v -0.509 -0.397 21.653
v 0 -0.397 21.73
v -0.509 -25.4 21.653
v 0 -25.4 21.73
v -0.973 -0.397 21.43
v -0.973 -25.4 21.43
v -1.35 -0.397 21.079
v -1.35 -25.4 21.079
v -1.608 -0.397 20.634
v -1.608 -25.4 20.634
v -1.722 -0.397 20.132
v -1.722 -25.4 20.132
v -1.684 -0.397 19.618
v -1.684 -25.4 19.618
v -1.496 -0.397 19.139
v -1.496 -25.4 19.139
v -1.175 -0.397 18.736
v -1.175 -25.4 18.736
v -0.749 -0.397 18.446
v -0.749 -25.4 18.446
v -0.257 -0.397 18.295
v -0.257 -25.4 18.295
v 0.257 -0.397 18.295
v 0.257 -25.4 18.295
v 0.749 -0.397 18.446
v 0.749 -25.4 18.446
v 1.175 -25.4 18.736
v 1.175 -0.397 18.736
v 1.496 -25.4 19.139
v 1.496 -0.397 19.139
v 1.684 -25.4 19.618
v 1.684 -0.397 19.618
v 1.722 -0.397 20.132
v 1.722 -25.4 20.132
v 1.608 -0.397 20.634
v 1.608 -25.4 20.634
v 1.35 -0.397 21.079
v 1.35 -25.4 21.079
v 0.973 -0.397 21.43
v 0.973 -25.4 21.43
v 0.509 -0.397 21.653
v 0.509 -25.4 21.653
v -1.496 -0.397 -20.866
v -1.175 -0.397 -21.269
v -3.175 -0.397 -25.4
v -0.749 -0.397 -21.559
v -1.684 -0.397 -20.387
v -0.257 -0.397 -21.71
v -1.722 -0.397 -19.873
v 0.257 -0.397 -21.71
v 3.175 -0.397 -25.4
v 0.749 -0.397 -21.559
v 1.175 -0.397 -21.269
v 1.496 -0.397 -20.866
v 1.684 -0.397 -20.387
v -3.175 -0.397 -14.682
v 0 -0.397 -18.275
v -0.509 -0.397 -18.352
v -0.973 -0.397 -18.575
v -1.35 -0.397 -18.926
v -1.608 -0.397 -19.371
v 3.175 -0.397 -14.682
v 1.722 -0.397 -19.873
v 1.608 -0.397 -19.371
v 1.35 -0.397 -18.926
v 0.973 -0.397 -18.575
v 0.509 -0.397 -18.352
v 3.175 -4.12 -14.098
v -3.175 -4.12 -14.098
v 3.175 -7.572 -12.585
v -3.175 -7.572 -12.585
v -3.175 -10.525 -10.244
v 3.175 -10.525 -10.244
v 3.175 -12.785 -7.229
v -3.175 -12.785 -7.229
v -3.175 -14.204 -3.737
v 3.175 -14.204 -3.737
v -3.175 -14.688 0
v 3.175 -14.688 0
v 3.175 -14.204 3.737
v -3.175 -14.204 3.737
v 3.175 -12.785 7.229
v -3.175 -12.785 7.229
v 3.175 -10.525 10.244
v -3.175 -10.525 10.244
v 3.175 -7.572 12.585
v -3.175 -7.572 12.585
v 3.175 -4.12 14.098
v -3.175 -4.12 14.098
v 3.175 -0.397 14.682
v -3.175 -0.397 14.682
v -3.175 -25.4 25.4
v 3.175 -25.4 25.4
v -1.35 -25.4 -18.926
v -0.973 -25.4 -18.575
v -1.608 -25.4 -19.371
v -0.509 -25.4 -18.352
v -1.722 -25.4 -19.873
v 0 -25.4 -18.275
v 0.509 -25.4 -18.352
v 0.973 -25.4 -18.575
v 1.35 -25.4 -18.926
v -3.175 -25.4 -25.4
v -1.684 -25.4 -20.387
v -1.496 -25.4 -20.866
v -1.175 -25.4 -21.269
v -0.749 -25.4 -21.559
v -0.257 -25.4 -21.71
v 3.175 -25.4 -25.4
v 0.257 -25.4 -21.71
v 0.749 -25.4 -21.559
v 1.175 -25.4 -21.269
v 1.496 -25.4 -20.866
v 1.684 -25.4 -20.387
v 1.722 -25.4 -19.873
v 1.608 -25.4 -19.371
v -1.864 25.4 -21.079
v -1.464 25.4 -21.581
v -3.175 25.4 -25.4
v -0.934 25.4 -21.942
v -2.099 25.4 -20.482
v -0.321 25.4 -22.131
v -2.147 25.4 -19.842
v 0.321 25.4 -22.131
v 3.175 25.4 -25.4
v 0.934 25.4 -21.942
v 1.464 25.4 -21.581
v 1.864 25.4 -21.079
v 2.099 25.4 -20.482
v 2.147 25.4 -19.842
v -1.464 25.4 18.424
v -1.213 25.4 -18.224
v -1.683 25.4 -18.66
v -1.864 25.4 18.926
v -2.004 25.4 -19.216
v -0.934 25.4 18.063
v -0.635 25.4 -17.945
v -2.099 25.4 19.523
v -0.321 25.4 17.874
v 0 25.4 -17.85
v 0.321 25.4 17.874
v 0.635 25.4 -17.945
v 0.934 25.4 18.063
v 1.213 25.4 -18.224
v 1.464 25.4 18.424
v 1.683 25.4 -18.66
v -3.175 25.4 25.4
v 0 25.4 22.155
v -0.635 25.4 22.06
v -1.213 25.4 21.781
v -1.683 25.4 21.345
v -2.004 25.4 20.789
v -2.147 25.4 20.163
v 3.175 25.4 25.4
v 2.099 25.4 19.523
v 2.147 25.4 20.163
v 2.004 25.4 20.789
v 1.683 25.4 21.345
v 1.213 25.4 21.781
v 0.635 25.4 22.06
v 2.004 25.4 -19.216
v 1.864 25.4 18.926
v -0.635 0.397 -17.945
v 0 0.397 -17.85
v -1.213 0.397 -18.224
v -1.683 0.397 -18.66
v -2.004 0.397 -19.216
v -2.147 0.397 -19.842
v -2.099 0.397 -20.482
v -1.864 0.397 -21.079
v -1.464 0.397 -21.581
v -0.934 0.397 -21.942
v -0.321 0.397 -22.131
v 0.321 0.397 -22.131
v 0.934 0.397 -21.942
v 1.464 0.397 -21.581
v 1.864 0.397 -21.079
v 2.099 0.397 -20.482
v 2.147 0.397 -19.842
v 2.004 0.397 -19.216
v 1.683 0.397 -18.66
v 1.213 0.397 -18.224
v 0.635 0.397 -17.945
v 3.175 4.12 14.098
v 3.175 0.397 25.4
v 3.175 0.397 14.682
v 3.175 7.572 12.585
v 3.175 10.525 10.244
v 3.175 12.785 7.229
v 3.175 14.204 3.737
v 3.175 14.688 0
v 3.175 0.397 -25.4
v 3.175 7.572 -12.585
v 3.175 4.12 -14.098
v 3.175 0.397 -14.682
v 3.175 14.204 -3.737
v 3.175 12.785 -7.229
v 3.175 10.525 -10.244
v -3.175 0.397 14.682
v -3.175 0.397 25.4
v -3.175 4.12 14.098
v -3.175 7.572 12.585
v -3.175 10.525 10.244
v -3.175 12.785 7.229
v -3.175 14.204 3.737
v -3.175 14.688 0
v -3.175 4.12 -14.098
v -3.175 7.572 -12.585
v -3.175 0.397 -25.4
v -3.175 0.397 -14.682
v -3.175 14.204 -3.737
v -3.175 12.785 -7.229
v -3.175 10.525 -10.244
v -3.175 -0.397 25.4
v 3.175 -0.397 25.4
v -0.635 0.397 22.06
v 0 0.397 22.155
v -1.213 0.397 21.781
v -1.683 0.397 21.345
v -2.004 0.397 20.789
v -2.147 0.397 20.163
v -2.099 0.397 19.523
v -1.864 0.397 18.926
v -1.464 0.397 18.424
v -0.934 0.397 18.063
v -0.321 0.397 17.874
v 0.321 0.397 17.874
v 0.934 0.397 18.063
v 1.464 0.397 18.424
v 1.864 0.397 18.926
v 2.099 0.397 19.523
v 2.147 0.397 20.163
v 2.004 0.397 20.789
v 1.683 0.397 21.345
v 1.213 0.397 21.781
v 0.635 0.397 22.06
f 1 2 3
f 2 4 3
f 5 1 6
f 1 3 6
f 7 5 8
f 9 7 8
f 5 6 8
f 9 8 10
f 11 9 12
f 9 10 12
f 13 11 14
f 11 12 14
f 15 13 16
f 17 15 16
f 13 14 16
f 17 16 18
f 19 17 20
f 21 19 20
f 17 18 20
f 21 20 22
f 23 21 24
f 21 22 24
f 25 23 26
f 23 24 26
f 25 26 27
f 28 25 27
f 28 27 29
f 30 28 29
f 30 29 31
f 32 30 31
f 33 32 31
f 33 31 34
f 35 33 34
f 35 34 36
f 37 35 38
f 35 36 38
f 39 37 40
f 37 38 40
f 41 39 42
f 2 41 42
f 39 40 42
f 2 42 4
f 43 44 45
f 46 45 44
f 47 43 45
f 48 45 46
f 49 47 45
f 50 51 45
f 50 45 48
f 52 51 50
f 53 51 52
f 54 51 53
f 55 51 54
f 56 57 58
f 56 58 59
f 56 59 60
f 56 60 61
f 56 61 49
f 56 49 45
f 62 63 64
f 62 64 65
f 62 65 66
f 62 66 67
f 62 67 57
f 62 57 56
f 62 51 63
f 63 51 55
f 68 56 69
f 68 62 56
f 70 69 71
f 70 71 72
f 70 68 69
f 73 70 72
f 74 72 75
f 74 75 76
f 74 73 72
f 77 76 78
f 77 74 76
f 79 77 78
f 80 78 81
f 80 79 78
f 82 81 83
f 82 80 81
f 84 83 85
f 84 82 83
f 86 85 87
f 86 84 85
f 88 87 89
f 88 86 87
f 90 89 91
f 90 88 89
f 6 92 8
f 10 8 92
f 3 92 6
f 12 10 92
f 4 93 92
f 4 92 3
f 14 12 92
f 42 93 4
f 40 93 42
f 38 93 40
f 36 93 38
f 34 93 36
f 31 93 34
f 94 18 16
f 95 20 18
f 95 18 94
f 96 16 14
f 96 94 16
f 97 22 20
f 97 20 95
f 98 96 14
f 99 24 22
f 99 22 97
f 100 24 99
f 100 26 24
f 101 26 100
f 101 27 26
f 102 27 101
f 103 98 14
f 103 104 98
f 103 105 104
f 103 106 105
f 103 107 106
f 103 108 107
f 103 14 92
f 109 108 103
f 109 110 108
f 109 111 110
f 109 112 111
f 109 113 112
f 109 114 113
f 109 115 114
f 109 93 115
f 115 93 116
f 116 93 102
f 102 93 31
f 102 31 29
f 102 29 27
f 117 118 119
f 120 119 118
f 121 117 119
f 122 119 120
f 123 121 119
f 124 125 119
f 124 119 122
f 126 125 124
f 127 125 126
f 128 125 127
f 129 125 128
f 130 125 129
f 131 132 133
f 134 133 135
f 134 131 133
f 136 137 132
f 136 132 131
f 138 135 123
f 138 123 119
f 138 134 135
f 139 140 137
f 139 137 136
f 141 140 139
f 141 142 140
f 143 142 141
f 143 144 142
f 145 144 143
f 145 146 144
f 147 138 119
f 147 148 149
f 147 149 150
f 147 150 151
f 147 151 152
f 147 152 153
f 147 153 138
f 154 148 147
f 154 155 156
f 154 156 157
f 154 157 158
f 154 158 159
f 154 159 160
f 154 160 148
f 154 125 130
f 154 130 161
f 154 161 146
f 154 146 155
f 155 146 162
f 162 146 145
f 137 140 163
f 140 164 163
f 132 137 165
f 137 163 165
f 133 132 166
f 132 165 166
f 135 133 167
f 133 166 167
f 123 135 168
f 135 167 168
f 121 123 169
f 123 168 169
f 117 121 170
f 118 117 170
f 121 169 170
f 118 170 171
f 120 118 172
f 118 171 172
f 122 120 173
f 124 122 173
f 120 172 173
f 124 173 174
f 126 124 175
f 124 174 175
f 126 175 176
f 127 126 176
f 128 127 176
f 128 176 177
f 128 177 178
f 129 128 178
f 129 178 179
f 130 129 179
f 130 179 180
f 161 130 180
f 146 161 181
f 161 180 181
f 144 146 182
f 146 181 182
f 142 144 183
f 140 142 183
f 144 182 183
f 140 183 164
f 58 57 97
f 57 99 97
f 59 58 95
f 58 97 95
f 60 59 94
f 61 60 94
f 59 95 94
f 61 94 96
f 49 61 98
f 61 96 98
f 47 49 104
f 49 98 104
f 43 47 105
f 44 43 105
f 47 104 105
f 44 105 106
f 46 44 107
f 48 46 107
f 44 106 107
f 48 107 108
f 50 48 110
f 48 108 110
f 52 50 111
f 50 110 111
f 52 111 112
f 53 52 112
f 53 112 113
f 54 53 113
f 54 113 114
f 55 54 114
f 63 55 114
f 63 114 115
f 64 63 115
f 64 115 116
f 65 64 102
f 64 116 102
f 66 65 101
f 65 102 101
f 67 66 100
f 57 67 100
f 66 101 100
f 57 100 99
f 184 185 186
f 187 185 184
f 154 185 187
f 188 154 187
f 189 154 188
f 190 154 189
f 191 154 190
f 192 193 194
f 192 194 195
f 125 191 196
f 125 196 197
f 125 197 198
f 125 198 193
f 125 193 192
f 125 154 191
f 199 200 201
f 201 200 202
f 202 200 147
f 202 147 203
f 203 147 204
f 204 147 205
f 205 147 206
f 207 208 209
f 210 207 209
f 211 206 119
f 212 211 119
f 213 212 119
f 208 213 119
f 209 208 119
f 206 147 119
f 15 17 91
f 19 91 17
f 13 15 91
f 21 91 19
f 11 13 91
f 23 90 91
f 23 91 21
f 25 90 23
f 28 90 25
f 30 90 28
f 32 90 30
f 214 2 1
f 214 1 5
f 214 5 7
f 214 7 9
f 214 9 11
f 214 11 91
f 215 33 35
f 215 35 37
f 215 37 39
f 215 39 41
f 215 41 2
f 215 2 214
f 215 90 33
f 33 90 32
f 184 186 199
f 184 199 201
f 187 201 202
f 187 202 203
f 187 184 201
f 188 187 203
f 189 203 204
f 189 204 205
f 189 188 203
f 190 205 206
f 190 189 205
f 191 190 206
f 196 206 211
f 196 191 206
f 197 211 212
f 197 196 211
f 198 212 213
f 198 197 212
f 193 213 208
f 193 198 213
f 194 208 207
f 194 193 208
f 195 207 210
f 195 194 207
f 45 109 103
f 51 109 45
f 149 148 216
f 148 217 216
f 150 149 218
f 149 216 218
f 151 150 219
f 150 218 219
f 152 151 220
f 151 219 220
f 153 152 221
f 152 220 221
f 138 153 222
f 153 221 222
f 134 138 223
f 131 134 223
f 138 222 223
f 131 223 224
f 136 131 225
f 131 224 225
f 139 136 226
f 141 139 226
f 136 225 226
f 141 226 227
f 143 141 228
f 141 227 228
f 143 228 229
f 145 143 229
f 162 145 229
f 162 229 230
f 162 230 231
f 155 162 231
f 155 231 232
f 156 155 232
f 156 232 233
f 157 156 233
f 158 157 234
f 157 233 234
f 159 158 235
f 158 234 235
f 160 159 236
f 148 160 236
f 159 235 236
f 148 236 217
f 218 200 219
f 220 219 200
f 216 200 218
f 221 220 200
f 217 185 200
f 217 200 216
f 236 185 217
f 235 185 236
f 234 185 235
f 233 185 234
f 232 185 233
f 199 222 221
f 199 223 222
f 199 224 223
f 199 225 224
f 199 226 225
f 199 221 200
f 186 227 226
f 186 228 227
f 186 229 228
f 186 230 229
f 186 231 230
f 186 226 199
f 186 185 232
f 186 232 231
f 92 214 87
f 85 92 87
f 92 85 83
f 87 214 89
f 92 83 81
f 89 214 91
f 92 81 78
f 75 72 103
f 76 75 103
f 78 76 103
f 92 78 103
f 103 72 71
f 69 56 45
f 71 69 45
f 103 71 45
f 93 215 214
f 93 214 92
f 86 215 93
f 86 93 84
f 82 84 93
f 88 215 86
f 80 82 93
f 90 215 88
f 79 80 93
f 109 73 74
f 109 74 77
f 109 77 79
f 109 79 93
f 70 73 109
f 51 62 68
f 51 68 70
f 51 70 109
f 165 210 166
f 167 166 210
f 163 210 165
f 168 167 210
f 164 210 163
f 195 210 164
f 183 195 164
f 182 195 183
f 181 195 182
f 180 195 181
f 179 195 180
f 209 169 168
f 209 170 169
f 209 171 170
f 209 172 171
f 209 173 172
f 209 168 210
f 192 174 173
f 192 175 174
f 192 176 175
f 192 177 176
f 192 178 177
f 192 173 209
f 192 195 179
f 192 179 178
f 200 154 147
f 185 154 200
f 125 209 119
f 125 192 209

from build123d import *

# Parameters (mm, degrees)
BOSS_EXTRUDE1_DEPTH                   = 3.175
BOSS_EXTRUDE1_2_DEPTH                 = 3.175
SKETCH4_W                             = 2.15265
SKETCH4_H                             = 25.003125
F_18_0_1695_DIAMETER_HOLE2_AT_2_COUNT = 2
F_18_0_1695_DIAMETER_HOLE2_AT_2_PITCH = 40.005
SKETCH5_W                             = 1.7272
SKETCH5_H                             = 50.8
F_29_0_136_DIAMETER_HOLE1_AT_2_COUNT  = 2
F_29_0_136_DIAMETER_HOLE1_AT_2_PITCH  = 40.005


with BuildPart() as part:
    # Sketch1 → Boss-Extrude1 (new, symmetric)
    with BuildSketch(Plane(origin=(0, 0, 0), x_dir=(0, 0, -1), z_dir=(1, 0, 0))):
        with BuildLine():
            Line((-25.4, 25.4), (-25.4, 0.396875))
            Line((-25.4, 0.396875), (-14.682136986, 0.396875))
            ThreePointArc((-14.682136986, 0.396875), (0, 14.6875), (14.682136986, 0.396875))
            Line((14.682136986, 0.396875), (25.4, 0.396875))
            Line((25.4, 0.396875), (25.4, 25.4))
            Line((25.4, 25.4), (-25.4, 25.4))
        make_face()
    extrude(amount=BOSS_EXTRUDE1_DEPTH, both=True)

    # Sketch4 → #18 (0.1695) Diameter Hole2 (revolve, cut)
    with BuildSketch(Plane(origin=(0, 25.4, 20.0025), x_dir=(0, 0, 1), z_dir=(1, 0, 0))):
        with Locations((1.076325, 12.5015625)):
            Rectangle(SKETCH4_W, SKETCH4_H)
    f_18_0_1695_diameter_hole2 = revolve(axis=Axis((0, 31.75, 20.0025), (0, -1, 0)), mode=Mode.SUBTRACT)

    # #18 (0.1695) Diameter Hole2 at 2: #18 (0.1695) Diameter Hole2 ×2
    with Locations(*[(0, 0, -i * F_18_0_1695_DIAMETER_HOLE2_AT_2_PITCH) for i in range(1, F_18_0_1695_DIAMETER_HOLE2_AT_2_COUNT)]):
        add(f_18_0_1695_diameter_hole2, mode=Mode.SUBTRACT)


with BuildPart() as body_2:
    # Sketch1 → Boss-Extrude1 2 (new, symmetric)
    with BuildSketch(Plane(origin=(0, 0, 0), x_dir=(0, 0, -1), z_dir=(1, 0, 0))):
        with BuildLine():
            Line((-14.682136986, -0.396875), (-25.4, -0.396875))
            Line((-25.4, -0.396875), (-25.4, -25.4))
            Line((-25.4, -25.4), (25.4, -25.4))
            Line((25.4, -25.4), (25.4, -0.396875))
            Line((25.4, -0.396875), (14.682136986, -0.396875))
            ThreePointArc((14.682136986, -0.396875), (0, -14.6875), (-14.682136986, -0.396875))
        make_face()
    extrude(amount=BOSS_EXTRUDE1_2_DEPTH, both=True)

    # Sketch5 → #29 (0.136) Diameter Hole1 (revolve, cut)
    with BuildSketch(Plane(origin=(0, 25.4, 20.0025), x_dir=(0, 0, 1), z_dir=(1, 0, 0))):
        with Locations((0.8636, 25.4)):
            Rectangle(SKETCH5_W, SKETCH5_H)
    f_29_0_136_diameter_hole1 = revolve(axis=Axis((0, 31.75, 20.0025), (0, -1, 0)), mode=Mode.SUBTRACT)

    # #29 (0.136) Diameter Hole1 at 2: #29 (0.136) Diameter Hole1 ×2
    with Locations(*[(0, 0, -i * F_29_0_136_DIAMETER_HOLE1_AT_2_PITCH) for i in range(1, F_29_0_136_DIAMETER_HOLE1_AT_2_COUNT)]):
        add(f_29_0_136_diameter_hole1, mode=Mode.SUBTRACT)


solid = Compound([part.part, body_2.part])
